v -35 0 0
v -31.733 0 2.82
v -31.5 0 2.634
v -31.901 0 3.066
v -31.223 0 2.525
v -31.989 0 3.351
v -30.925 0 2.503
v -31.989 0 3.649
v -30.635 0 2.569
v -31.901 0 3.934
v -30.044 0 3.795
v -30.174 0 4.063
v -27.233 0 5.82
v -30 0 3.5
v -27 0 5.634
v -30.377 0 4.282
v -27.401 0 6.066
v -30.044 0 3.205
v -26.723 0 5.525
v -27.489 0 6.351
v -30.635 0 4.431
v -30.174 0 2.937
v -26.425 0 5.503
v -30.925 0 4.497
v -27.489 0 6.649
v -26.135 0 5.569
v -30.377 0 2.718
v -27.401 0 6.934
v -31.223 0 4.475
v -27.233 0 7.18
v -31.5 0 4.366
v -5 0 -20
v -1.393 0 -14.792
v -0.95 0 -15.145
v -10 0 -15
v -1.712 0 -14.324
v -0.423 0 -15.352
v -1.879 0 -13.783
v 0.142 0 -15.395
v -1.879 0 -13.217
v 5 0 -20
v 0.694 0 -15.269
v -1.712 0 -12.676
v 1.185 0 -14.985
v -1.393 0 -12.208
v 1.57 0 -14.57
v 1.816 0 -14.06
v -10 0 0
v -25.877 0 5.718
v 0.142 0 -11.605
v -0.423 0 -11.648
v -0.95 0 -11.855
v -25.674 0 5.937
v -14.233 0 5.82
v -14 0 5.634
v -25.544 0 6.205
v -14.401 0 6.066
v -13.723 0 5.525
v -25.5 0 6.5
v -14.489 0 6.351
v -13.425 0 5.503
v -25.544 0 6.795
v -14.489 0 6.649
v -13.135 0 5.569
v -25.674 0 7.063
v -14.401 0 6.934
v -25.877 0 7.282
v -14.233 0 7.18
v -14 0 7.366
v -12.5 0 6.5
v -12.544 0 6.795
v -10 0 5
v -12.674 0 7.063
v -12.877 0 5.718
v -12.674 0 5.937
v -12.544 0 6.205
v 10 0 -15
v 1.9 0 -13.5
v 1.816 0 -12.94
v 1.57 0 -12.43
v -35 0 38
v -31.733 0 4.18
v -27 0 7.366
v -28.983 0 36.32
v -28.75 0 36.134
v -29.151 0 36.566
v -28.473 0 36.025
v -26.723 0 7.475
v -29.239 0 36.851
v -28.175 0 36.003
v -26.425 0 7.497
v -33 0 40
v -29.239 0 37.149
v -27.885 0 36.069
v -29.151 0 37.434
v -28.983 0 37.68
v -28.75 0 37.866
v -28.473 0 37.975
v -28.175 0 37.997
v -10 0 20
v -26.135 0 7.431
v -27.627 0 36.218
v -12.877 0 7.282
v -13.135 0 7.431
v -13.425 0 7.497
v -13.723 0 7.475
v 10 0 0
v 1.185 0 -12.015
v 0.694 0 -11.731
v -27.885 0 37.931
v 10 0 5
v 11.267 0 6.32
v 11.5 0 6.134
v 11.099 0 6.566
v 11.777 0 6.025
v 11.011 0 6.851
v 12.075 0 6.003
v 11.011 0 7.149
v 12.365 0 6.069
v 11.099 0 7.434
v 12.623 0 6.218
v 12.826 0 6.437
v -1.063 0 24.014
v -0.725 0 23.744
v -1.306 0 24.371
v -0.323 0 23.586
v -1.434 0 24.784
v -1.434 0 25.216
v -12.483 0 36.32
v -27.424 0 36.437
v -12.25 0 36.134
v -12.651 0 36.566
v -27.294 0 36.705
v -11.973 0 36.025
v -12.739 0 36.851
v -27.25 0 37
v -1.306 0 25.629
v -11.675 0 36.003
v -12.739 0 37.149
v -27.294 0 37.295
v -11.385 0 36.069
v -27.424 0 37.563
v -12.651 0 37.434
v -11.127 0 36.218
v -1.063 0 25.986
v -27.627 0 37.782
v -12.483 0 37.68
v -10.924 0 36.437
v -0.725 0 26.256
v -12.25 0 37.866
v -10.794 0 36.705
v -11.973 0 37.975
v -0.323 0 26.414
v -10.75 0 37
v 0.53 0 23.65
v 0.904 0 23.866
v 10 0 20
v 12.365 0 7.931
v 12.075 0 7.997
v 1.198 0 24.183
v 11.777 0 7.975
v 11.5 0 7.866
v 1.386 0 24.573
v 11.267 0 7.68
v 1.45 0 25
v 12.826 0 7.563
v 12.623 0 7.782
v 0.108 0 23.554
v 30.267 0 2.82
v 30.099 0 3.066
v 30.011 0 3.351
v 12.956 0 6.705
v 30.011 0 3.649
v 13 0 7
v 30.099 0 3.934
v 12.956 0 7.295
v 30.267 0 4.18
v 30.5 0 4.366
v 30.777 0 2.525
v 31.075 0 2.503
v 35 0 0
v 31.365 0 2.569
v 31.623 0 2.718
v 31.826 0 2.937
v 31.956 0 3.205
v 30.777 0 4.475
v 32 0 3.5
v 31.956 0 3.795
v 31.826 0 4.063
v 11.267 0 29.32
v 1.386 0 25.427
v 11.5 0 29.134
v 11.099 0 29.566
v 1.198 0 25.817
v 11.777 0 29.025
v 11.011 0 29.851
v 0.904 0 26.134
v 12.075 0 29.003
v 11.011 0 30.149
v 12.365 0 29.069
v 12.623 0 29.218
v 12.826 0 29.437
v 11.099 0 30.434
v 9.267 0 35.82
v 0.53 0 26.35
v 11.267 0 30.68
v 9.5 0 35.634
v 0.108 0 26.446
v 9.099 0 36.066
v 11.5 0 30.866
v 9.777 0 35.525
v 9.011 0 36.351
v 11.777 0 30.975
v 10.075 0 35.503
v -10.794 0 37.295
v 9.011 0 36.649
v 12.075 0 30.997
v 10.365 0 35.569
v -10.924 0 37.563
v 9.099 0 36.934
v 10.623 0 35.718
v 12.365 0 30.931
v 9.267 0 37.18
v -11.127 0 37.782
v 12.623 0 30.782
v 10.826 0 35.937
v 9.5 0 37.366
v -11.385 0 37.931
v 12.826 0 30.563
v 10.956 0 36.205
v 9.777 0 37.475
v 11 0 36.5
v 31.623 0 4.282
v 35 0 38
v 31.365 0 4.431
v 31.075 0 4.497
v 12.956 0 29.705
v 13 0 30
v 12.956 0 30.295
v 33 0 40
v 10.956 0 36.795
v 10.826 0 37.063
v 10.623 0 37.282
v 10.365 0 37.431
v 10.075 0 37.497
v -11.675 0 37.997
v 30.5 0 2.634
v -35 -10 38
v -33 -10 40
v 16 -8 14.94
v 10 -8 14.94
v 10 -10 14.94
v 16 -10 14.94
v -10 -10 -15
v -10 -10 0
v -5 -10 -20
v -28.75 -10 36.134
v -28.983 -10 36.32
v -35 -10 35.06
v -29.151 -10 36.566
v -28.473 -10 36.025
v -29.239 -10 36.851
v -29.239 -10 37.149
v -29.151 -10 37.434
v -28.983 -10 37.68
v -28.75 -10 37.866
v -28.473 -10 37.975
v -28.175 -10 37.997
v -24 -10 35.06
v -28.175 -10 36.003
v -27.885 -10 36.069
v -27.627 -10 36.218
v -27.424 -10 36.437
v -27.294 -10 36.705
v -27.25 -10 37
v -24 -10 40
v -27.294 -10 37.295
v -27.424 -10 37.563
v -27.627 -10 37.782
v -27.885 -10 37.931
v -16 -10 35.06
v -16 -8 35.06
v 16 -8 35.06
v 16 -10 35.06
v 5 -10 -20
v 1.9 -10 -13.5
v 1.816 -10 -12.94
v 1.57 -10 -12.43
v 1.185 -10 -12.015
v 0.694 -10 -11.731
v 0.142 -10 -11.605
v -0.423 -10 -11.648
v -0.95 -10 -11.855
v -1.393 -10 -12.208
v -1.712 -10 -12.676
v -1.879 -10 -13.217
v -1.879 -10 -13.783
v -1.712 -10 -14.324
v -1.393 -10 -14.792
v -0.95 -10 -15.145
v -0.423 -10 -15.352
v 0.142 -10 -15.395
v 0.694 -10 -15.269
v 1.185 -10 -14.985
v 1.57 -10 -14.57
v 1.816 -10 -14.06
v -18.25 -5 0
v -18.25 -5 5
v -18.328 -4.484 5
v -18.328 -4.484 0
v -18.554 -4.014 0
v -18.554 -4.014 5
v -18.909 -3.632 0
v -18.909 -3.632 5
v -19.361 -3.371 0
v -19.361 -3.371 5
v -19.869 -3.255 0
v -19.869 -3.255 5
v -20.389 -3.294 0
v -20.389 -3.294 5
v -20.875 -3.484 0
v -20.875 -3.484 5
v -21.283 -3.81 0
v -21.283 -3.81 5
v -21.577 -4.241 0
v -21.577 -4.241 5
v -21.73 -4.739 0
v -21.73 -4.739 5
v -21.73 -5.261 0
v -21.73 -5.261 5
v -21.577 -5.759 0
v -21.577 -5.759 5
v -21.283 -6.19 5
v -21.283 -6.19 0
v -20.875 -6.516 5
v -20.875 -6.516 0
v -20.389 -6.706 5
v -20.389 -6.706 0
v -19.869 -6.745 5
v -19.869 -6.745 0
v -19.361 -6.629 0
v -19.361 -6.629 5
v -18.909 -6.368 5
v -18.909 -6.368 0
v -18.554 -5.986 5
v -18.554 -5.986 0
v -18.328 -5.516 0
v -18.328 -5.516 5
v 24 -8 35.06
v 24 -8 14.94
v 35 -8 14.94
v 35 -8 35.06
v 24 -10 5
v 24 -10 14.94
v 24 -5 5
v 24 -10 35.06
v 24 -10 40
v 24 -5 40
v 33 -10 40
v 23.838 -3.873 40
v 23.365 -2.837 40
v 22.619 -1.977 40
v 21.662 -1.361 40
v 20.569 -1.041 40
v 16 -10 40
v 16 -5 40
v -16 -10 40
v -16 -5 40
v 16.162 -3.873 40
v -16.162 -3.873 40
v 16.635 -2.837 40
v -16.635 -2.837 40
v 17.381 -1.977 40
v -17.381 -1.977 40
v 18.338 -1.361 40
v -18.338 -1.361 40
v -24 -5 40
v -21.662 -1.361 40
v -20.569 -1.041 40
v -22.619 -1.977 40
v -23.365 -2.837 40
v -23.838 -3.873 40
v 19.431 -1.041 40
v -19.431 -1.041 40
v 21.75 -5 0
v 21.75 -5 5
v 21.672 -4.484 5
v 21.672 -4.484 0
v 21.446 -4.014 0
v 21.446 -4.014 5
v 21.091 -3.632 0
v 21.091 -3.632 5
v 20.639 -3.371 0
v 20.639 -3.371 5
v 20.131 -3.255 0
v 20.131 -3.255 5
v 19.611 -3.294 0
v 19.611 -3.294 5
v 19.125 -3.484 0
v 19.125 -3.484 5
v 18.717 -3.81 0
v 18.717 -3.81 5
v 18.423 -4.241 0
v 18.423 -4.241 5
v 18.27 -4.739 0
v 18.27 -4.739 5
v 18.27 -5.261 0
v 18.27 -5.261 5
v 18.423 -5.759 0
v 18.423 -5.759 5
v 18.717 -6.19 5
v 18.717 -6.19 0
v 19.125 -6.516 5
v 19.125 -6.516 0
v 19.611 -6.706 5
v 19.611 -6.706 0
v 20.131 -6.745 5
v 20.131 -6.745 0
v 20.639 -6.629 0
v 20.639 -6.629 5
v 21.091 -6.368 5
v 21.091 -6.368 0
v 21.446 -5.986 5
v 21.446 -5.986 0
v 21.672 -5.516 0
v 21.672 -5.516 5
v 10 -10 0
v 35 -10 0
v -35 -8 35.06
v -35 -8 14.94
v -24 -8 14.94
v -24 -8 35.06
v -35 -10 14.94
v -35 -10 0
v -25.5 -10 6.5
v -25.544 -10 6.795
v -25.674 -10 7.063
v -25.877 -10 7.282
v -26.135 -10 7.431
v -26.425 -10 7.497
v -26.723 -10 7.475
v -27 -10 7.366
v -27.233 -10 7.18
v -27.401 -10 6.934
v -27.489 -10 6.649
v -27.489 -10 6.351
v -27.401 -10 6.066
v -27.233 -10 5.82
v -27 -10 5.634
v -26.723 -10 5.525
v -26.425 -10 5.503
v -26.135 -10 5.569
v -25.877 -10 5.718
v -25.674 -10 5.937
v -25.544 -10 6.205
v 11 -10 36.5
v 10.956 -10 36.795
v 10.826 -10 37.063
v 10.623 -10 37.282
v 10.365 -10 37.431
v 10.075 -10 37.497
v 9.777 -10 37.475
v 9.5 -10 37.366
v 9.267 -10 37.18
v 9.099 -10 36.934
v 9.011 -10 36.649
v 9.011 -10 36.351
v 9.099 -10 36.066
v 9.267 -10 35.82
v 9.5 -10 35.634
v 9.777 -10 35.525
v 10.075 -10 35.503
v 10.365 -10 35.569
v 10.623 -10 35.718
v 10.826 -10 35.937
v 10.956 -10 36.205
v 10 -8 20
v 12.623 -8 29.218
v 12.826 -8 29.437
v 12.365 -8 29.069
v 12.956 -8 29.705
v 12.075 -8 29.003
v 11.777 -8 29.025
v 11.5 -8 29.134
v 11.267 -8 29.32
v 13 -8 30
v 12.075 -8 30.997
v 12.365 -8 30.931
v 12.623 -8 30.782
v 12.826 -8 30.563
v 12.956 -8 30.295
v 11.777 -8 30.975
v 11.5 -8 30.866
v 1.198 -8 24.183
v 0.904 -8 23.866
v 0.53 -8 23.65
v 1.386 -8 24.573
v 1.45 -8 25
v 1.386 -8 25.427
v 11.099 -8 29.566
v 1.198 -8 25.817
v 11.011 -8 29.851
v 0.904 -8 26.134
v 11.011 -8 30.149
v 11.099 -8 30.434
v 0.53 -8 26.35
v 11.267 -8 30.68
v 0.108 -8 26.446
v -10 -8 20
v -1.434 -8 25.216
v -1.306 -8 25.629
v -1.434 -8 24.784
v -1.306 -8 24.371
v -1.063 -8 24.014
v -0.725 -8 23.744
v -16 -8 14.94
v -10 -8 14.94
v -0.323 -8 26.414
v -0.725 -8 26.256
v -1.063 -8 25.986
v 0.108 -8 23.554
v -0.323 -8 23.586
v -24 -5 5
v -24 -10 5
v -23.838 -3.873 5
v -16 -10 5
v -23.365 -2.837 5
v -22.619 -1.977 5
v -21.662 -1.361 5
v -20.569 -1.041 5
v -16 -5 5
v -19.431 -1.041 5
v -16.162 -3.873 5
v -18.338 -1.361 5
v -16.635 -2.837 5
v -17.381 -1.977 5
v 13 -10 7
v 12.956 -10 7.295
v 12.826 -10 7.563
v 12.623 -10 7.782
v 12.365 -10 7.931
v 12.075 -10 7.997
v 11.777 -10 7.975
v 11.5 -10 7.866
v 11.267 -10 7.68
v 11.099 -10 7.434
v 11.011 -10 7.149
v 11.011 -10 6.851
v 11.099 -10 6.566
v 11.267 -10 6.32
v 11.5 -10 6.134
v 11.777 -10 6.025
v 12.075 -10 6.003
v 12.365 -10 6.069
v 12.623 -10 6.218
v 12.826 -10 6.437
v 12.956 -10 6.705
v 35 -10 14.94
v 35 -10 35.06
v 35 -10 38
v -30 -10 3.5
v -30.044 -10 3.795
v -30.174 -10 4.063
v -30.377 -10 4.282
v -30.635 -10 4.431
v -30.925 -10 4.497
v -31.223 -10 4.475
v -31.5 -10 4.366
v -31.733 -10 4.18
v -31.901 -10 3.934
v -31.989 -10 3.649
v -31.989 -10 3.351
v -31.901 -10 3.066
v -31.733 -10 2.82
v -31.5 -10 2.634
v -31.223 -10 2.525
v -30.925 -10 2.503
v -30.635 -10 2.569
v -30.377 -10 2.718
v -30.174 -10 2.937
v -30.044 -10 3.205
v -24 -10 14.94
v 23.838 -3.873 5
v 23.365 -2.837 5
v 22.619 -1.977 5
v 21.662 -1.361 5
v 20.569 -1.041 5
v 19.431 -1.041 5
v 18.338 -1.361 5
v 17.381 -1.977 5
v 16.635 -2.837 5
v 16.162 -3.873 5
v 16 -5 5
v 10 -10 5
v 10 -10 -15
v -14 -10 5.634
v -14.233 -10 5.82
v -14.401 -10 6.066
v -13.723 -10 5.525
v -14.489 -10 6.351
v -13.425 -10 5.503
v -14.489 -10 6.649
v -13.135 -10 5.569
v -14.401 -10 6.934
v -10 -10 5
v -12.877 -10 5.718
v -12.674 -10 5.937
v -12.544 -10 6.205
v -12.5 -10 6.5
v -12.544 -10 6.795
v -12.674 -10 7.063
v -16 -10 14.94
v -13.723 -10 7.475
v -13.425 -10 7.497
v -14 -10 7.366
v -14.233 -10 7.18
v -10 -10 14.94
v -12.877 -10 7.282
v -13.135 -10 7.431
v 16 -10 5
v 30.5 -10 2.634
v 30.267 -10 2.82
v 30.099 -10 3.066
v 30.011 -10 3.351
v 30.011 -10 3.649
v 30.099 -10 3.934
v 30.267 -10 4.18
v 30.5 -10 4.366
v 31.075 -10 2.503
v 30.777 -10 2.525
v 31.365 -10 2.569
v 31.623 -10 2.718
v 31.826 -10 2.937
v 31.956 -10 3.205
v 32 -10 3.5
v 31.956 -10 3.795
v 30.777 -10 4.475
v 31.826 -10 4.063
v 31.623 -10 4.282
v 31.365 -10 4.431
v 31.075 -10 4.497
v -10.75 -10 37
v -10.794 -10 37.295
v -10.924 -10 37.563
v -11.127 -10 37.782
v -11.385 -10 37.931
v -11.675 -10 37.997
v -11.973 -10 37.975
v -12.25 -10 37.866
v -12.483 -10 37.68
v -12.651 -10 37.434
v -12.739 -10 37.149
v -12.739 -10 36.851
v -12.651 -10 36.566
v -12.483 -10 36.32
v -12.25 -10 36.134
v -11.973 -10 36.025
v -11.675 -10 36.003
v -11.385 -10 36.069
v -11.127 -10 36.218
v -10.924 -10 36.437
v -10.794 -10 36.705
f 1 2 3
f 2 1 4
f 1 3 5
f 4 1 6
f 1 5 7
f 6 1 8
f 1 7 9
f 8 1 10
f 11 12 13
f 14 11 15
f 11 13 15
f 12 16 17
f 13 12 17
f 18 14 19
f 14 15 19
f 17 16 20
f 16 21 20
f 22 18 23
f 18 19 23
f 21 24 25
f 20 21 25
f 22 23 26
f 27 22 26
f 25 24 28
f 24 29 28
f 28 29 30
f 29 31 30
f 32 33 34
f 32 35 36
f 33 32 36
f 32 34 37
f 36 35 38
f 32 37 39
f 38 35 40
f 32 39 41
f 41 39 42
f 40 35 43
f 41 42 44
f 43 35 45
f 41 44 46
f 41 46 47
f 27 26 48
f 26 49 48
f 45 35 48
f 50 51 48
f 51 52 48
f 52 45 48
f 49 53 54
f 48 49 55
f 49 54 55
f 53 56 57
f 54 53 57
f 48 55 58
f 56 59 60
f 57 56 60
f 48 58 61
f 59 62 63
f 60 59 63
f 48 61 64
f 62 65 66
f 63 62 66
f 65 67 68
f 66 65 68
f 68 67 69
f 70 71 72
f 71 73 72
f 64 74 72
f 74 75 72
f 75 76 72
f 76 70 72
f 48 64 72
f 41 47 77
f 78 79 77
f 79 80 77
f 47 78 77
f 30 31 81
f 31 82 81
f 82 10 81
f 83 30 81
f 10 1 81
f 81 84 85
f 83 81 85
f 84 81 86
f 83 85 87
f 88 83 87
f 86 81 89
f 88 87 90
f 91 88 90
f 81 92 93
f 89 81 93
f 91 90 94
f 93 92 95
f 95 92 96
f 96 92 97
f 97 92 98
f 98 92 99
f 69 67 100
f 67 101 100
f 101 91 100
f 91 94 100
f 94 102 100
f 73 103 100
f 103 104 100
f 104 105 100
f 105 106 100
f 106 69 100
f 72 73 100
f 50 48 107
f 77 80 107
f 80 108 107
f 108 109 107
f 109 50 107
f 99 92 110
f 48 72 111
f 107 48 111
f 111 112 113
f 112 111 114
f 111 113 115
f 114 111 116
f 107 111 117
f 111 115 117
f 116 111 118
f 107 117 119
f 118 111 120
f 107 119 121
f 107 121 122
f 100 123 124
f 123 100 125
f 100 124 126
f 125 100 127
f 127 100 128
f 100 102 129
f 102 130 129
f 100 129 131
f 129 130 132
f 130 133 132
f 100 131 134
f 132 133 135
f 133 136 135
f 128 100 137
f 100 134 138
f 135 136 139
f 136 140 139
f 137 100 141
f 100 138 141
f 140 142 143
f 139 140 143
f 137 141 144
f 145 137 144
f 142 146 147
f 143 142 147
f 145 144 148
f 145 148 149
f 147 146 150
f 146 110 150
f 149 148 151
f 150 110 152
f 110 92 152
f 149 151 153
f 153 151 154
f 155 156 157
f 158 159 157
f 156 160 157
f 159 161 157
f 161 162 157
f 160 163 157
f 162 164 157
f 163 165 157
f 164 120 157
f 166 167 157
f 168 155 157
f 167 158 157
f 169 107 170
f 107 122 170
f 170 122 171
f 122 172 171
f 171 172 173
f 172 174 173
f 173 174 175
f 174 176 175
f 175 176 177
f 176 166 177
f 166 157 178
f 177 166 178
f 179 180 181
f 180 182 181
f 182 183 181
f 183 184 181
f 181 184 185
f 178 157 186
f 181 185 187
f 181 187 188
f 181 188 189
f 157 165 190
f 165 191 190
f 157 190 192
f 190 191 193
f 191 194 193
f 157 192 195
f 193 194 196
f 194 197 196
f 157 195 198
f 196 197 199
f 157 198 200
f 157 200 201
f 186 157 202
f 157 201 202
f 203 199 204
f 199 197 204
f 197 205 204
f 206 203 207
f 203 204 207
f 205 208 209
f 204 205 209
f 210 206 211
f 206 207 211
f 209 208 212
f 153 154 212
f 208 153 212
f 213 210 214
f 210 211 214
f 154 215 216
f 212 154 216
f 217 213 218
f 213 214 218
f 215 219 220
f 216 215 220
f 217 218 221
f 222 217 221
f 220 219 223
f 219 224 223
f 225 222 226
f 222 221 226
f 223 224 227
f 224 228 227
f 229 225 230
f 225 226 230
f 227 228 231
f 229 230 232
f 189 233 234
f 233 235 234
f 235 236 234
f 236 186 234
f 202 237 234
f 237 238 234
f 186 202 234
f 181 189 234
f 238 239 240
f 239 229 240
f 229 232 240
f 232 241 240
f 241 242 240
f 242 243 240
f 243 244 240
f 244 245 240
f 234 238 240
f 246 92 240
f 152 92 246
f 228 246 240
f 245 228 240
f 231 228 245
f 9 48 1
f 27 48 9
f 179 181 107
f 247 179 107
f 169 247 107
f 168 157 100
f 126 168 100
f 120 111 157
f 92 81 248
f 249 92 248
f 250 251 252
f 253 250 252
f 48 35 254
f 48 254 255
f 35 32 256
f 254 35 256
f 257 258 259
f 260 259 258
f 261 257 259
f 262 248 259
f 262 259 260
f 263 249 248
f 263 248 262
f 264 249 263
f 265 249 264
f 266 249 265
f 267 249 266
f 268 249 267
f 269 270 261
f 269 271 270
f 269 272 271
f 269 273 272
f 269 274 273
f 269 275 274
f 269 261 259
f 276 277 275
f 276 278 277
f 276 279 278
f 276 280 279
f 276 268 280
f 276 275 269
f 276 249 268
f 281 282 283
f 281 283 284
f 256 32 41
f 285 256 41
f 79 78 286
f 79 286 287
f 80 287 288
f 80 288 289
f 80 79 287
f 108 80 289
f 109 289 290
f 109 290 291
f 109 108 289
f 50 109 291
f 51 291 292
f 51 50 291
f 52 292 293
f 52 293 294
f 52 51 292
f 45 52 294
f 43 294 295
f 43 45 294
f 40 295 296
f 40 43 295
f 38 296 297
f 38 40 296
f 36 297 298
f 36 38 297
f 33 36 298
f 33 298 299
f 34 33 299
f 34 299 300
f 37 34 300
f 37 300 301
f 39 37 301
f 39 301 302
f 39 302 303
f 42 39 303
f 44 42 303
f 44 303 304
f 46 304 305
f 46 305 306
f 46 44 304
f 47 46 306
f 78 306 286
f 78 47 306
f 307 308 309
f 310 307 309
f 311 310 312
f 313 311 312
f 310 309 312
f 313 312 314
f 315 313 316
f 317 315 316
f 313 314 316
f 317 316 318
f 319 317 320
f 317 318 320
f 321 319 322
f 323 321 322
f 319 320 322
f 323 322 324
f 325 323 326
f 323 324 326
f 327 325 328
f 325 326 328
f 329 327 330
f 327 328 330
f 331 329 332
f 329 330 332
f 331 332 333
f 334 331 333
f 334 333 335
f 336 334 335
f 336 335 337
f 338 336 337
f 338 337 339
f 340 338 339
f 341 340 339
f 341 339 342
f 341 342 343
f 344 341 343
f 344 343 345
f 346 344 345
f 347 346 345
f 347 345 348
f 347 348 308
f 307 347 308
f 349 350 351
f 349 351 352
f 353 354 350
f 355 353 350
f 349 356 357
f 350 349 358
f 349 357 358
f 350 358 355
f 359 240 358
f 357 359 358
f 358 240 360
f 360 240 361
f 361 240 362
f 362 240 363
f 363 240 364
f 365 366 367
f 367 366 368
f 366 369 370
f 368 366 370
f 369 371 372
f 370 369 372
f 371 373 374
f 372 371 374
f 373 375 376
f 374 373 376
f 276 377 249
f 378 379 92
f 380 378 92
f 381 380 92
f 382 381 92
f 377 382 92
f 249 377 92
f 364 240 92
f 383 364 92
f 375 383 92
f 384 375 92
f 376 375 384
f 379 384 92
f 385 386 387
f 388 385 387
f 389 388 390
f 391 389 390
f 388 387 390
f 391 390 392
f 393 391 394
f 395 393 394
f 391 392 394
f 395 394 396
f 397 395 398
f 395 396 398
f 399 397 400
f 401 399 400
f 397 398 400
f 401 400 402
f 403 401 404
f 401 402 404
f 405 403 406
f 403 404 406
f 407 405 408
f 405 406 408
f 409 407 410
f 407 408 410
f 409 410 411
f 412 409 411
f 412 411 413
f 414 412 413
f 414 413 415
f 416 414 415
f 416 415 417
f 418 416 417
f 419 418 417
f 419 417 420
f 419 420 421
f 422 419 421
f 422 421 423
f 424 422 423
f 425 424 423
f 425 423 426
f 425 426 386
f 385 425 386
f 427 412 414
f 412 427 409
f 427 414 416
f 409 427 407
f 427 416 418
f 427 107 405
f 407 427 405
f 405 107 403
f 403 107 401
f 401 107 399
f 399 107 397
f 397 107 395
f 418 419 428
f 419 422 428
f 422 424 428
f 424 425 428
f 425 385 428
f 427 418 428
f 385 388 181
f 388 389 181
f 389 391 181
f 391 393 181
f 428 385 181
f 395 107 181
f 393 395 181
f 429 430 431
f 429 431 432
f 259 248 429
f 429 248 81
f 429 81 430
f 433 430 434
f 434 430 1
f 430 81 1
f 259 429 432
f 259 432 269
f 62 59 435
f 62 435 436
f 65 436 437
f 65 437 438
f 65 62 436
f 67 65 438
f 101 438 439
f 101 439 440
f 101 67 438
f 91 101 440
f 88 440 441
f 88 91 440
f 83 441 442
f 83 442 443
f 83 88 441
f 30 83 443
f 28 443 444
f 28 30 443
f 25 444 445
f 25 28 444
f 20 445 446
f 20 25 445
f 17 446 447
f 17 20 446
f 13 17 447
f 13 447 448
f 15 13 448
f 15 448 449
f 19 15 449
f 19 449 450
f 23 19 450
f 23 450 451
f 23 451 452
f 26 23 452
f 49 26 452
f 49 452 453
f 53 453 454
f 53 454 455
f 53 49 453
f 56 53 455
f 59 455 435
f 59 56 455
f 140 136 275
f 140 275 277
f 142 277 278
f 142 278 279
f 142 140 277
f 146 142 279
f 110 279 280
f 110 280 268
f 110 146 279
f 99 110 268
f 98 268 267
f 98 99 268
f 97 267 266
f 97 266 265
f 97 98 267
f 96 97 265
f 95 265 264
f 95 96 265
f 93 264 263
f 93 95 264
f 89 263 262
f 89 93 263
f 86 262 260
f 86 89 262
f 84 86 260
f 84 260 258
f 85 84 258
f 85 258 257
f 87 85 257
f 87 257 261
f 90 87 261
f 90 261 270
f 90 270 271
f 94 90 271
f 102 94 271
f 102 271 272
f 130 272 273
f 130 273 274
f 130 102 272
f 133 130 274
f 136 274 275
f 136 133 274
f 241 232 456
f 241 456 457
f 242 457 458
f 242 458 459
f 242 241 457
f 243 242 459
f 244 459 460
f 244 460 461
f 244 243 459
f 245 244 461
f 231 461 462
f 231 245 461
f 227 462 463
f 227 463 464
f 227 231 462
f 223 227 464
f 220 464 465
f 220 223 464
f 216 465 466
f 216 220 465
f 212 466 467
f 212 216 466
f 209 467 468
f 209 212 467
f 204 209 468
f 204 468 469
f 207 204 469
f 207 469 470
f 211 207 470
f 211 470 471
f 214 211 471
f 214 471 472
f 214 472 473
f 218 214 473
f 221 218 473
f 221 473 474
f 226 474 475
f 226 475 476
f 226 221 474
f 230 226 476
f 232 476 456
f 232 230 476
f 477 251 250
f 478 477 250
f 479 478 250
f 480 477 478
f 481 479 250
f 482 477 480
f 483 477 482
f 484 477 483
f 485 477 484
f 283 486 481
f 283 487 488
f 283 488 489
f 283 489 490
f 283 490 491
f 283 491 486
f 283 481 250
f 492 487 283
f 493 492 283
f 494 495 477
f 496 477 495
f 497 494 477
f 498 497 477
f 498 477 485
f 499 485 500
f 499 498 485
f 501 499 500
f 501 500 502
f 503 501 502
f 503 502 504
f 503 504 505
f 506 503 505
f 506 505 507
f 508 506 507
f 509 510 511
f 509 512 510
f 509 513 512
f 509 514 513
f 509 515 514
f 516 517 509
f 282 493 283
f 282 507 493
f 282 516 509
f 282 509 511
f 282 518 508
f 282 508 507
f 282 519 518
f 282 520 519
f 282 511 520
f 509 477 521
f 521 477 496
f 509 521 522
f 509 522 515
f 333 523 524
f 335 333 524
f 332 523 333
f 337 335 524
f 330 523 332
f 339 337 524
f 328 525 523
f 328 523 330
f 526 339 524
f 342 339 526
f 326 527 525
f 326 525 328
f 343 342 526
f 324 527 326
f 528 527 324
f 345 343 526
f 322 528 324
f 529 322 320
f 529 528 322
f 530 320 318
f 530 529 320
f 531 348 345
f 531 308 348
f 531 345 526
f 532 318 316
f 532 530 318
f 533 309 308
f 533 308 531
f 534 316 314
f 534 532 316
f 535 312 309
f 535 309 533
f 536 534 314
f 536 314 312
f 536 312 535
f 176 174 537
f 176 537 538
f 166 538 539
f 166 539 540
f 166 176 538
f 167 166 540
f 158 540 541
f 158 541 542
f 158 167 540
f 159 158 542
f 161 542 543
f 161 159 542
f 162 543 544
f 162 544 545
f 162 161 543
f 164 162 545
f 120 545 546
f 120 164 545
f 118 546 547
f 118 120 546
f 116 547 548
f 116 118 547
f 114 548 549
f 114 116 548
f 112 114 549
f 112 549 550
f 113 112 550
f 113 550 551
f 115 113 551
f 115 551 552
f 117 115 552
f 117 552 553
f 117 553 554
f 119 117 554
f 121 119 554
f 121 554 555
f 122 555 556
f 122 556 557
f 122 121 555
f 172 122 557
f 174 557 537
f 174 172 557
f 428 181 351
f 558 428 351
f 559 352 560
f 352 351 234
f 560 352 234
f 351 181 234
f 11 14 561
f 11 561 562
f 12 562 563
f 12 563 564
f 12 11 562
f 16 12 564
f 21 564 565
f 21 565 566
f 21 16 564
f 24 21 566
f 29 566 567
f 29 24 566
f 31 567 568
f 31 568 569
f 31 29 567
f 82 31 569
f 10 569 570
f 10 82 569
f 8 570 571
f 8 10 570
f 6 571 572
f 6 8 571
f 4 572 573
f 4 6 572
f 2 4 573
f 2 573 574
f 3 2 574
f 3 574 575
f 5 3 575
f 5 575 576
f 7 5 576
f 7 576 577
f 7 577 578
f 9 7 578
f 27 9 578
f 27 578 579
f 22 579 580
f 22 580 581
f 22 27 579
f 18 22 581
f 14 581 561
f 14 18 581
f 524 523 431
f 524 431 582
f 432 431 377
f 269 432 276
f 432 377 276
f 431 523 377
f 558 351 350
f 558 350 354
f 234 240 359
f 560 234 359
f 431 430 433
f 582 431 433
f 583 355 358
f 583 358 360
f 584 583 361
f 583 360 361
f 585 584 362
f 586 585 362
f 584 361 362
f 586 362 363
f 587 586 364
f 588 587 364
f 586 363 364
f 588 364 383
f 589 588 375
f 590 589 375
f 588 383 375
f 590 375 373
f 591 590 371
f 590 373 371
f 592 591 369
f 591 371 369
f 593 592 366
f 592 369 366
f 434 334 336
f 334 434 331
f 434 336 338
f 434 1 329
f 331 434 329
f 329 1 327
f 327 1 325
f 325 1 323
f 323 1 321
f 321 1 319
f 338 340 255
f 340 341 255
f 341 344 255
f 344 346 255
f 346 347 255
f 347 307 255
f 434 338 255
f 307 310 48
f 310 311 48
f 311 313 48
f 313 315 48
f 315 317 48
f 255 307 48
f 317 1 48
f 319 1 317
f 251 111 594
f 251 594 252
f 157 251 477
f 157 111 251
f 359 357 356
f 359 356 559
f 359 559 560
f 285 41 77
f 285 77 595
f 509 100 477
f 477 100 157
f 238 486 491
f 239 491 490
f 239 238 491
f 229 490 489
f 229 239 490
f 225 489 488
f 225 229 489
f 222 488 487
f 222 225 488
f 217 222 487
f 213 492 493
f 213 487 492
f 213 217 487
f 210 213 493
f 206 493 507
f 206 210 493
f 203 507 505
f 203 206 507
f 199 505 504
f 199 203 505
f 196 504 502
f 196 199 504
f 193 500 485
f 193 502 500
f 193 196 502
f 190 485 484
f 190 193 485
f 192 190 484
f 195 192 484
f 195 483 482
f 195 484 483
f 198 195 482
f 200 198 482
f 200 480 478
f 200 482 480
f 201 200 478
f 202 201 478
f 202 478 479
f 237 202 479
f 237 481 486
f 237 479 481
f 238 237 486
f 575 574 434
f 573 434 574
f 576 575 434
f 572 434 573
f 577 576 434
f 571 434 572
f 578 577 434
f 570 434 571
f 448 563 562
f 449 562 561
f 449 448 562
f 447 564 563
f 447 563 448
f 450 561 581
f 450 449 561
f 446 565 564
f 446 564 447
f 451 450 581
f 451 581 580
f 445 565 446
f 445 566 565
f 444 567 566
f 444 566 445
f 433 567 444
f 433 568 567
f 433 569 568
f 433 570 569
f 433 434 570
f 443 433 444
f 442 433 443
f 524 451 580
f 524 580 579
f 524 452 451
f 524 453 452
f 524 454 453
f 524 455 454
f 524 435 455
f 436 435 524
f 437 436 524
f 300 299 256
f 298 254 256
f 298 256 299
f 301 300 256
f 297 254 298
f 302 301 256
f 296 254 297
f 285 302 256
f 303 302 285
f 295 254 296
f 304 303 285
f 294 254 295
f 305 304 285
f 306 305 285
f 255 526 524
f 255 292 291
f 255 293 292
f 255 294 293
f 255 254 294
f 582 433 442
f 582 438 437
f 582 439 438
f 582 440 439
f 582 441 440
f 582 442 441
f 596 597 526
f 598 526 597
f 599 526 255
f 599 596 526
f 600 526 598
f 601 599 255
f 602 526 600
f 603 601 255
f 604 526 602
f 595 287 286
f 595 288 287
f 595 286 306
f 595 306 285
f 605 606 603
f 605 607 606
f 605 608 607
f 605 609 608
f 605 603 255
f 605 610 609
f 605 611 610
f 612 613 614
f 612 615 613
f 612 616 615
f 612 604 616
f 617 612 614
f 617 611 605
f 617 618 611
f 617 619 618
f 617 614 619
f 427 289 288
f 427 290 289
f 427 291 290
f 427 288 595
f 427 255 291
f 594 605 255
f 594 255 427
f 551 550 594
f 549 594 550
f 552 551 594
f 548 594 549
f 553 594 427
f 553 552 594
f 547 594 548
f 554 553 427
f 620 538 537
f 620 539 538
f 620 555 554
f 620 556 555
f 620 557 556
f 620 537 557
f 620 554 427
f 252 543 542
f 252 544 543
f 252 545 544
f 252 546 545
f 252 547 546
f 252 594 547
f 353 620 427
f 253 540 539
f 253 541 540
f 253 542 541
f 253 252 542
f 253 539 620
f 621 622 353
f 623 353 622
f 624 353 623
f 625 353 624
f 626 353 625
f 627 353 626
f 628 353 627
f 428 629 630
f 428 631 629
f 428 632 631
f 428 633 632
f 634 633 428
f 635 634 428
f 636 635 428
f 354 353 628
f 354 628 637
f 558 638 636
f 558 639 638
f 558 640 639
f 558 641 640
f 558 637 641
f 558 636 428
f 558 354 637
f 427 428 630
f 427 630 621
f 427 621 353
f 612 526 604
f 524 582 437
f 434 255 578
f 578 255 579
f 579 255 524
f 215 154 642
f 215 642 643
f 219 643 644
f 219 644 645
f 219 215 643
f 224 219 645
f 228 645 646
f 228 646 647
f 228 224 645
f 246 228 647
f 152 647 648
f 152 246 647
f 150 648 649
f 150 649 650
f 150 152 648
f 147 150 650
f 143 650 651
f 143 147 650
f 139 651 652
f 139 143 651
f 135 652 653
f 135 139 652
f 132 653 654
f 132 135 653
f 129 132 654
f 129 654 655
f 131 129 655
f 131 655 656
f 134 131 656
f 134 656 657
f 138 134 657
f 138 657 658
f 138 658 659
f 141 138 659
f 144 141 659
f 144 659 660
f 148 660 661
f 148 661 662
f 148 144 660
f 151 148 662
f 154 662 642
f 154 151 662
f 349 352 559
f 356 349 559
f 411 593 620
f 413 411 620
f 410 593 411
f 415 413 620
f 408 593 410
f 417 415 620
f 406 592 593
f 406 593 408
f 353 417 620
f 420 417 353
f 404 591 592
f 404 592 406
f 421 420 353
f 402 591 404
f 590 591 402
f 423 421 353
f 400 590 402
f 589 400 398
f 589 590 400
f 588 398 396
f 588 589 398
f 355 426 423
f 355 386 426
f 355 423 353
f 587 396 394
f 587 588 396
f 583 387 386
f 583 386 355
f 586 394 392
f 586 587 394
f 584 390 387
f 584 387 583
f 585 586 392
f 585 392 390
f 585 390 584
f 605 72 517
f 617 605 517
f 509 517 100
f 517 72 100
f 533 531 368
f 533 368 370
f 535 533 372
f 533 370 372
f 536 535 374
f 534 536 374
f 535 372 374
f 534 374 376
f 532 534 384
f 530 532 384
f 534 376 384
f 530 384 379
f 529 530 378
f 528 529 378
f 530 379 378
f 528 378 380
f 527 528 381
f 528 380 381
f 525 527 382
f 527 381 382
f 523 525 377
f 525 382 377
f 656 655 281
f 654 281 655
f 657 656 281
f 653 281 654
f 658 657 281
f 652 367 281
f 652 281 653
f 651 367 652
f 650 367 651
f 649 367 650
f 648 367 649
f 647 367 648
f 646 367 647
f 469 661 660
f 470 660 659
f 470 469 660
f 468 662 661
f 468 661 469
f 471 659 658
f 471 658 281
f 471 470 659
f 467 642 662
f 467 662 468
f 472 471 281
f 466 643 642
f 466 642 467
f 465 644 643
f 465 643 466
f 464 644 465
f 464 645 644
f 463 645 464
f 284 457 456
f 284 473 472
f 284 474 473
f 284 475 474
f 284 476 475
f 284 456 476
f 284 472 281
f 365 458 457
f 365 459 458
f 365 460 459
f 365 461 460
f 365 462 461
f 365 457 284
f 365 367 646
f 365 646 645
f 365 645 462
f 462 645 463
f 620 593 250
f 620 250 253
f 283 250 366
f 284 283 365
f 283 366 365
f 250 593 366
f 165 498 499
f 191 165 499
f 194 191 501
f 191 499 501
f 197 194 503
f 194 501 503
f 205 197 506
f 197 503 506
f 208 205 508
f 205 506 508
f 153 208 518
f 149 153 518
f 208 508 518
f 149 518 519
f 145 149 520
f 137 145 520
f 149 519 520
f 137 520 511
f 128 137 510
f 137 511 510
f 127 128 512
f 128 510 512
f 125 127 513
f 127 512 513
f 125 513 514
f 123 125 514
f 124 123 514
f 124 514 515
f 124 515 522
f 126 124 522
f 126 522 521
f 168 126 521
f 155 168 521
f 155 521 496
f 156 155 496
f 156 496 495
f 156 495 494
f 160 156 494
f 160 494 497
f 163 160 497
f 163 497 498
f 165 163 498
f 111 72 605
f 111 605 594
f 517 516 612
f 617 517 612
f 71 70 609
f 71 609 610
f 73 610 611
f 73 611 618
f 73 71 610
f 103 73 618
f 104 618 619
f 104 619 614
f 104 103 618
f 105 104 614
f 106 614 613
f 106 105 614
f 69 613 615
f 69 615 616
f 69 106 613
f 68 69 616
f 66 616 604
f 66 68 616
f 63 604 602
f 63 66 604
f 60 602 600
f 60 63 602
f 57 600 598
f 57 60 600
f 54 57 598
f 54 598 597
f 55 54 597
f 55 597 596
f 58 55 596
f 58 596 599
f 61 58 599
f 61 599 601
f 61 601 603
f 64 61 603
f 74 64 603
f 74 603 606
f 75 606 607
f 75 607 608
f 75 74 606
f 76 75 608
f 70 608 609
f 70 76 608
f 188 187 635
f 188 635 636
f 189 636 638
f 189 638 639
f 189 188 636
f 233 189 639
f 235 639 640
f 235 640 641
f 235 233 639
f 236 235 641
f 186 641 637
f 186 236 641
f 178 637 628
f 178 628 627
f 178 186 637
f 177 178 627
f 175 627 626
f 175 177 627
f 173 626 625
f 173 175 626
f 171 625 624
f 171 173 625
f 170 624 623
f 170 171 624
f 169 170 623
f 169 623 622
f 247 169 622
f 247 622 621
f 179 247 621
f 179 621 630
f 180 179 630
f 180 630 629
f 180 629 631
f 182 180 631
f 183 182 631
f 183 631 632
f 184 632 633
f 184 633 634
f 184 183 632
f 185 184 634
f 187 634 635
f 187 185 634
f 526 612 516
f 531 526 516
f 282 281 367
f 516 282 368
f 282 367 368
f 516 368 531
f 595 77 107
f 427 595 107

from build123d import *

# Parameters (mm, degrees)
F0_R     = 1
F0_W     = 20
F0_H     = 15
F0_H_2   = 20
F0_R_2   = 1.9
F1_DEPTH = 10
F2_R     = 1.75
F3_DEPTH = 60.001
F4_W     = 2
F4_H     = 20.12
F5_DEPTH = 70.001
F6_R     = 1.45
F7_DEPTH = 8.001
F8_DEPTH = 35
F9_SIZE  = 5
F10_SIZE = 2


with BuildPart() as f1:
    # F0 (on Front) → F1 (new body)
    with BuildSketch(Plane.XZ):
        Polygon((35, 40), (-35, 40), (-35, 0), (-10, 0), (10, 0), (35, 0), align=None)
        with Locations((-31, 3.5)):
            Circle(F0_R, mode=Mode.SUBTRACT)
        with Locations((-26.5, 6.5)):
            Circle(F0_R, mode=Mode.SUBTRACT)
        with Locations((-13.5, 6.5)):
            Circle(F0_R, mode=Mode.SUBTRACT)
        with Locations((12, 7)):
            Circle(F0_R, mode=Mode.SUBTRACT)
        with Locations((31, 3.5)):
            Circle(F0_R, mode=Mode.SUBTRACT)
        with Locations((-28.25, 37)):
            Circle(F0_R, mode=Mode.SUBTRACT)
        with Locations((-11.75, 37)):
            Circle(F0_R, mode=Mode.SUBTRACT)
        with Locations((0, 12.5)):
            Rectangle(F0_W, F0_H, mode=Mode.SUBTRACT)
        with Locations((12, 30)):
            Circle(F0_R, mode=Mode.SUBTRACT)
        with Locations((10, 36.5)):
            Circle(F0_R, mode=Mode.SUBTRACT)
        with Locations((0, -10)):
            Rectangle(F0_W, F0_H_2)
        with Locations((0, -13.5)):
            Circle(F0_R_2, mode=Mode.SUBTRACT)
    extrude(amount=F1_DEPTH)

    # F2 (on face) → F3 (cut, through all)
    with BuildSketch(Plane.XY.offset(40)):
        with Locations((-20, -5)):
            Circle(F2_R)
        with Locations((20, -5)):
            Circle(F2_R)
    extrude(amount=-F3_DEPTH, mode=Mode.SUBTRACT)

    # F4 (on face) → F5 (cut, through all)
    with BuildSketch(Plane(origin=(-35, 0, 0), x_dir=(0, -1, 0), z_dir=(-1, 0, 0))):
        with Locations((9, 25)):
            Rectangle(F4_W, F4_H)
    extrude(amount=-F5_DEPTH, mode=Mode.SUBTRACT)

    # F6 (on face) → F7 (cut, through all)
    with BuildSketch(Plane.XZ.offset(8)):
        with Locations((0, 25)):
            Circle(F6_R)
    extrude(amount=-F7_DEPTH, mode=Mode.SUBTRACT)

    # F2 (on face) → F8 (cut)
    with BuildSketch(Plane.XY.offset(40)):
        with Locations((-20, -5)):
            Circle(F2_R)
        with Locations((20, -5)):
            Circle(F2_R)
        with BuildLine():
            Line((-24, -5), (-24, -10))
            Line((-24, -10), (-16, -10))
            Line((-16, -10), (-16, -5))
            ThreePointArc((-16, -5), (-20, -1), (-24, -5))
        make_face()
        with Locations((-20, -5)):
            Circle(F2_R, mode=Mode.SUBTRACT)
        with BuildLine():
            Line((16, -5), (16, -10))
            Line((16, -10), (24, -10))
            Line((24, -10), (24, -5))
            ThreePointArc((24, -5), (20, -1), (16, -5))
        make_face()
        with Locations((20, -5)):
            Circle(F2_R, mode=Mode.SUBTRACT)
    extrude(amount=-F8_DEPTH, mode=Mode.SUBTRACT)

    # F9
    f9_edges = [f1.edges().sort_by_distance(p)[0] for p in [
        (10, -5, -20),
        (-10, -5, -20),
    ]]
    chamfer(f9_edges, length=F9_SIZE)

    # F10
    f10_edges = [f1.edges().sort_by_distance(p)[0] for p in [
        (-35, -5, 40),
        (35, -5, 40),
    ]]
    chamfer(f10_edges, length=F10_SIZE)


solid = f1.part
